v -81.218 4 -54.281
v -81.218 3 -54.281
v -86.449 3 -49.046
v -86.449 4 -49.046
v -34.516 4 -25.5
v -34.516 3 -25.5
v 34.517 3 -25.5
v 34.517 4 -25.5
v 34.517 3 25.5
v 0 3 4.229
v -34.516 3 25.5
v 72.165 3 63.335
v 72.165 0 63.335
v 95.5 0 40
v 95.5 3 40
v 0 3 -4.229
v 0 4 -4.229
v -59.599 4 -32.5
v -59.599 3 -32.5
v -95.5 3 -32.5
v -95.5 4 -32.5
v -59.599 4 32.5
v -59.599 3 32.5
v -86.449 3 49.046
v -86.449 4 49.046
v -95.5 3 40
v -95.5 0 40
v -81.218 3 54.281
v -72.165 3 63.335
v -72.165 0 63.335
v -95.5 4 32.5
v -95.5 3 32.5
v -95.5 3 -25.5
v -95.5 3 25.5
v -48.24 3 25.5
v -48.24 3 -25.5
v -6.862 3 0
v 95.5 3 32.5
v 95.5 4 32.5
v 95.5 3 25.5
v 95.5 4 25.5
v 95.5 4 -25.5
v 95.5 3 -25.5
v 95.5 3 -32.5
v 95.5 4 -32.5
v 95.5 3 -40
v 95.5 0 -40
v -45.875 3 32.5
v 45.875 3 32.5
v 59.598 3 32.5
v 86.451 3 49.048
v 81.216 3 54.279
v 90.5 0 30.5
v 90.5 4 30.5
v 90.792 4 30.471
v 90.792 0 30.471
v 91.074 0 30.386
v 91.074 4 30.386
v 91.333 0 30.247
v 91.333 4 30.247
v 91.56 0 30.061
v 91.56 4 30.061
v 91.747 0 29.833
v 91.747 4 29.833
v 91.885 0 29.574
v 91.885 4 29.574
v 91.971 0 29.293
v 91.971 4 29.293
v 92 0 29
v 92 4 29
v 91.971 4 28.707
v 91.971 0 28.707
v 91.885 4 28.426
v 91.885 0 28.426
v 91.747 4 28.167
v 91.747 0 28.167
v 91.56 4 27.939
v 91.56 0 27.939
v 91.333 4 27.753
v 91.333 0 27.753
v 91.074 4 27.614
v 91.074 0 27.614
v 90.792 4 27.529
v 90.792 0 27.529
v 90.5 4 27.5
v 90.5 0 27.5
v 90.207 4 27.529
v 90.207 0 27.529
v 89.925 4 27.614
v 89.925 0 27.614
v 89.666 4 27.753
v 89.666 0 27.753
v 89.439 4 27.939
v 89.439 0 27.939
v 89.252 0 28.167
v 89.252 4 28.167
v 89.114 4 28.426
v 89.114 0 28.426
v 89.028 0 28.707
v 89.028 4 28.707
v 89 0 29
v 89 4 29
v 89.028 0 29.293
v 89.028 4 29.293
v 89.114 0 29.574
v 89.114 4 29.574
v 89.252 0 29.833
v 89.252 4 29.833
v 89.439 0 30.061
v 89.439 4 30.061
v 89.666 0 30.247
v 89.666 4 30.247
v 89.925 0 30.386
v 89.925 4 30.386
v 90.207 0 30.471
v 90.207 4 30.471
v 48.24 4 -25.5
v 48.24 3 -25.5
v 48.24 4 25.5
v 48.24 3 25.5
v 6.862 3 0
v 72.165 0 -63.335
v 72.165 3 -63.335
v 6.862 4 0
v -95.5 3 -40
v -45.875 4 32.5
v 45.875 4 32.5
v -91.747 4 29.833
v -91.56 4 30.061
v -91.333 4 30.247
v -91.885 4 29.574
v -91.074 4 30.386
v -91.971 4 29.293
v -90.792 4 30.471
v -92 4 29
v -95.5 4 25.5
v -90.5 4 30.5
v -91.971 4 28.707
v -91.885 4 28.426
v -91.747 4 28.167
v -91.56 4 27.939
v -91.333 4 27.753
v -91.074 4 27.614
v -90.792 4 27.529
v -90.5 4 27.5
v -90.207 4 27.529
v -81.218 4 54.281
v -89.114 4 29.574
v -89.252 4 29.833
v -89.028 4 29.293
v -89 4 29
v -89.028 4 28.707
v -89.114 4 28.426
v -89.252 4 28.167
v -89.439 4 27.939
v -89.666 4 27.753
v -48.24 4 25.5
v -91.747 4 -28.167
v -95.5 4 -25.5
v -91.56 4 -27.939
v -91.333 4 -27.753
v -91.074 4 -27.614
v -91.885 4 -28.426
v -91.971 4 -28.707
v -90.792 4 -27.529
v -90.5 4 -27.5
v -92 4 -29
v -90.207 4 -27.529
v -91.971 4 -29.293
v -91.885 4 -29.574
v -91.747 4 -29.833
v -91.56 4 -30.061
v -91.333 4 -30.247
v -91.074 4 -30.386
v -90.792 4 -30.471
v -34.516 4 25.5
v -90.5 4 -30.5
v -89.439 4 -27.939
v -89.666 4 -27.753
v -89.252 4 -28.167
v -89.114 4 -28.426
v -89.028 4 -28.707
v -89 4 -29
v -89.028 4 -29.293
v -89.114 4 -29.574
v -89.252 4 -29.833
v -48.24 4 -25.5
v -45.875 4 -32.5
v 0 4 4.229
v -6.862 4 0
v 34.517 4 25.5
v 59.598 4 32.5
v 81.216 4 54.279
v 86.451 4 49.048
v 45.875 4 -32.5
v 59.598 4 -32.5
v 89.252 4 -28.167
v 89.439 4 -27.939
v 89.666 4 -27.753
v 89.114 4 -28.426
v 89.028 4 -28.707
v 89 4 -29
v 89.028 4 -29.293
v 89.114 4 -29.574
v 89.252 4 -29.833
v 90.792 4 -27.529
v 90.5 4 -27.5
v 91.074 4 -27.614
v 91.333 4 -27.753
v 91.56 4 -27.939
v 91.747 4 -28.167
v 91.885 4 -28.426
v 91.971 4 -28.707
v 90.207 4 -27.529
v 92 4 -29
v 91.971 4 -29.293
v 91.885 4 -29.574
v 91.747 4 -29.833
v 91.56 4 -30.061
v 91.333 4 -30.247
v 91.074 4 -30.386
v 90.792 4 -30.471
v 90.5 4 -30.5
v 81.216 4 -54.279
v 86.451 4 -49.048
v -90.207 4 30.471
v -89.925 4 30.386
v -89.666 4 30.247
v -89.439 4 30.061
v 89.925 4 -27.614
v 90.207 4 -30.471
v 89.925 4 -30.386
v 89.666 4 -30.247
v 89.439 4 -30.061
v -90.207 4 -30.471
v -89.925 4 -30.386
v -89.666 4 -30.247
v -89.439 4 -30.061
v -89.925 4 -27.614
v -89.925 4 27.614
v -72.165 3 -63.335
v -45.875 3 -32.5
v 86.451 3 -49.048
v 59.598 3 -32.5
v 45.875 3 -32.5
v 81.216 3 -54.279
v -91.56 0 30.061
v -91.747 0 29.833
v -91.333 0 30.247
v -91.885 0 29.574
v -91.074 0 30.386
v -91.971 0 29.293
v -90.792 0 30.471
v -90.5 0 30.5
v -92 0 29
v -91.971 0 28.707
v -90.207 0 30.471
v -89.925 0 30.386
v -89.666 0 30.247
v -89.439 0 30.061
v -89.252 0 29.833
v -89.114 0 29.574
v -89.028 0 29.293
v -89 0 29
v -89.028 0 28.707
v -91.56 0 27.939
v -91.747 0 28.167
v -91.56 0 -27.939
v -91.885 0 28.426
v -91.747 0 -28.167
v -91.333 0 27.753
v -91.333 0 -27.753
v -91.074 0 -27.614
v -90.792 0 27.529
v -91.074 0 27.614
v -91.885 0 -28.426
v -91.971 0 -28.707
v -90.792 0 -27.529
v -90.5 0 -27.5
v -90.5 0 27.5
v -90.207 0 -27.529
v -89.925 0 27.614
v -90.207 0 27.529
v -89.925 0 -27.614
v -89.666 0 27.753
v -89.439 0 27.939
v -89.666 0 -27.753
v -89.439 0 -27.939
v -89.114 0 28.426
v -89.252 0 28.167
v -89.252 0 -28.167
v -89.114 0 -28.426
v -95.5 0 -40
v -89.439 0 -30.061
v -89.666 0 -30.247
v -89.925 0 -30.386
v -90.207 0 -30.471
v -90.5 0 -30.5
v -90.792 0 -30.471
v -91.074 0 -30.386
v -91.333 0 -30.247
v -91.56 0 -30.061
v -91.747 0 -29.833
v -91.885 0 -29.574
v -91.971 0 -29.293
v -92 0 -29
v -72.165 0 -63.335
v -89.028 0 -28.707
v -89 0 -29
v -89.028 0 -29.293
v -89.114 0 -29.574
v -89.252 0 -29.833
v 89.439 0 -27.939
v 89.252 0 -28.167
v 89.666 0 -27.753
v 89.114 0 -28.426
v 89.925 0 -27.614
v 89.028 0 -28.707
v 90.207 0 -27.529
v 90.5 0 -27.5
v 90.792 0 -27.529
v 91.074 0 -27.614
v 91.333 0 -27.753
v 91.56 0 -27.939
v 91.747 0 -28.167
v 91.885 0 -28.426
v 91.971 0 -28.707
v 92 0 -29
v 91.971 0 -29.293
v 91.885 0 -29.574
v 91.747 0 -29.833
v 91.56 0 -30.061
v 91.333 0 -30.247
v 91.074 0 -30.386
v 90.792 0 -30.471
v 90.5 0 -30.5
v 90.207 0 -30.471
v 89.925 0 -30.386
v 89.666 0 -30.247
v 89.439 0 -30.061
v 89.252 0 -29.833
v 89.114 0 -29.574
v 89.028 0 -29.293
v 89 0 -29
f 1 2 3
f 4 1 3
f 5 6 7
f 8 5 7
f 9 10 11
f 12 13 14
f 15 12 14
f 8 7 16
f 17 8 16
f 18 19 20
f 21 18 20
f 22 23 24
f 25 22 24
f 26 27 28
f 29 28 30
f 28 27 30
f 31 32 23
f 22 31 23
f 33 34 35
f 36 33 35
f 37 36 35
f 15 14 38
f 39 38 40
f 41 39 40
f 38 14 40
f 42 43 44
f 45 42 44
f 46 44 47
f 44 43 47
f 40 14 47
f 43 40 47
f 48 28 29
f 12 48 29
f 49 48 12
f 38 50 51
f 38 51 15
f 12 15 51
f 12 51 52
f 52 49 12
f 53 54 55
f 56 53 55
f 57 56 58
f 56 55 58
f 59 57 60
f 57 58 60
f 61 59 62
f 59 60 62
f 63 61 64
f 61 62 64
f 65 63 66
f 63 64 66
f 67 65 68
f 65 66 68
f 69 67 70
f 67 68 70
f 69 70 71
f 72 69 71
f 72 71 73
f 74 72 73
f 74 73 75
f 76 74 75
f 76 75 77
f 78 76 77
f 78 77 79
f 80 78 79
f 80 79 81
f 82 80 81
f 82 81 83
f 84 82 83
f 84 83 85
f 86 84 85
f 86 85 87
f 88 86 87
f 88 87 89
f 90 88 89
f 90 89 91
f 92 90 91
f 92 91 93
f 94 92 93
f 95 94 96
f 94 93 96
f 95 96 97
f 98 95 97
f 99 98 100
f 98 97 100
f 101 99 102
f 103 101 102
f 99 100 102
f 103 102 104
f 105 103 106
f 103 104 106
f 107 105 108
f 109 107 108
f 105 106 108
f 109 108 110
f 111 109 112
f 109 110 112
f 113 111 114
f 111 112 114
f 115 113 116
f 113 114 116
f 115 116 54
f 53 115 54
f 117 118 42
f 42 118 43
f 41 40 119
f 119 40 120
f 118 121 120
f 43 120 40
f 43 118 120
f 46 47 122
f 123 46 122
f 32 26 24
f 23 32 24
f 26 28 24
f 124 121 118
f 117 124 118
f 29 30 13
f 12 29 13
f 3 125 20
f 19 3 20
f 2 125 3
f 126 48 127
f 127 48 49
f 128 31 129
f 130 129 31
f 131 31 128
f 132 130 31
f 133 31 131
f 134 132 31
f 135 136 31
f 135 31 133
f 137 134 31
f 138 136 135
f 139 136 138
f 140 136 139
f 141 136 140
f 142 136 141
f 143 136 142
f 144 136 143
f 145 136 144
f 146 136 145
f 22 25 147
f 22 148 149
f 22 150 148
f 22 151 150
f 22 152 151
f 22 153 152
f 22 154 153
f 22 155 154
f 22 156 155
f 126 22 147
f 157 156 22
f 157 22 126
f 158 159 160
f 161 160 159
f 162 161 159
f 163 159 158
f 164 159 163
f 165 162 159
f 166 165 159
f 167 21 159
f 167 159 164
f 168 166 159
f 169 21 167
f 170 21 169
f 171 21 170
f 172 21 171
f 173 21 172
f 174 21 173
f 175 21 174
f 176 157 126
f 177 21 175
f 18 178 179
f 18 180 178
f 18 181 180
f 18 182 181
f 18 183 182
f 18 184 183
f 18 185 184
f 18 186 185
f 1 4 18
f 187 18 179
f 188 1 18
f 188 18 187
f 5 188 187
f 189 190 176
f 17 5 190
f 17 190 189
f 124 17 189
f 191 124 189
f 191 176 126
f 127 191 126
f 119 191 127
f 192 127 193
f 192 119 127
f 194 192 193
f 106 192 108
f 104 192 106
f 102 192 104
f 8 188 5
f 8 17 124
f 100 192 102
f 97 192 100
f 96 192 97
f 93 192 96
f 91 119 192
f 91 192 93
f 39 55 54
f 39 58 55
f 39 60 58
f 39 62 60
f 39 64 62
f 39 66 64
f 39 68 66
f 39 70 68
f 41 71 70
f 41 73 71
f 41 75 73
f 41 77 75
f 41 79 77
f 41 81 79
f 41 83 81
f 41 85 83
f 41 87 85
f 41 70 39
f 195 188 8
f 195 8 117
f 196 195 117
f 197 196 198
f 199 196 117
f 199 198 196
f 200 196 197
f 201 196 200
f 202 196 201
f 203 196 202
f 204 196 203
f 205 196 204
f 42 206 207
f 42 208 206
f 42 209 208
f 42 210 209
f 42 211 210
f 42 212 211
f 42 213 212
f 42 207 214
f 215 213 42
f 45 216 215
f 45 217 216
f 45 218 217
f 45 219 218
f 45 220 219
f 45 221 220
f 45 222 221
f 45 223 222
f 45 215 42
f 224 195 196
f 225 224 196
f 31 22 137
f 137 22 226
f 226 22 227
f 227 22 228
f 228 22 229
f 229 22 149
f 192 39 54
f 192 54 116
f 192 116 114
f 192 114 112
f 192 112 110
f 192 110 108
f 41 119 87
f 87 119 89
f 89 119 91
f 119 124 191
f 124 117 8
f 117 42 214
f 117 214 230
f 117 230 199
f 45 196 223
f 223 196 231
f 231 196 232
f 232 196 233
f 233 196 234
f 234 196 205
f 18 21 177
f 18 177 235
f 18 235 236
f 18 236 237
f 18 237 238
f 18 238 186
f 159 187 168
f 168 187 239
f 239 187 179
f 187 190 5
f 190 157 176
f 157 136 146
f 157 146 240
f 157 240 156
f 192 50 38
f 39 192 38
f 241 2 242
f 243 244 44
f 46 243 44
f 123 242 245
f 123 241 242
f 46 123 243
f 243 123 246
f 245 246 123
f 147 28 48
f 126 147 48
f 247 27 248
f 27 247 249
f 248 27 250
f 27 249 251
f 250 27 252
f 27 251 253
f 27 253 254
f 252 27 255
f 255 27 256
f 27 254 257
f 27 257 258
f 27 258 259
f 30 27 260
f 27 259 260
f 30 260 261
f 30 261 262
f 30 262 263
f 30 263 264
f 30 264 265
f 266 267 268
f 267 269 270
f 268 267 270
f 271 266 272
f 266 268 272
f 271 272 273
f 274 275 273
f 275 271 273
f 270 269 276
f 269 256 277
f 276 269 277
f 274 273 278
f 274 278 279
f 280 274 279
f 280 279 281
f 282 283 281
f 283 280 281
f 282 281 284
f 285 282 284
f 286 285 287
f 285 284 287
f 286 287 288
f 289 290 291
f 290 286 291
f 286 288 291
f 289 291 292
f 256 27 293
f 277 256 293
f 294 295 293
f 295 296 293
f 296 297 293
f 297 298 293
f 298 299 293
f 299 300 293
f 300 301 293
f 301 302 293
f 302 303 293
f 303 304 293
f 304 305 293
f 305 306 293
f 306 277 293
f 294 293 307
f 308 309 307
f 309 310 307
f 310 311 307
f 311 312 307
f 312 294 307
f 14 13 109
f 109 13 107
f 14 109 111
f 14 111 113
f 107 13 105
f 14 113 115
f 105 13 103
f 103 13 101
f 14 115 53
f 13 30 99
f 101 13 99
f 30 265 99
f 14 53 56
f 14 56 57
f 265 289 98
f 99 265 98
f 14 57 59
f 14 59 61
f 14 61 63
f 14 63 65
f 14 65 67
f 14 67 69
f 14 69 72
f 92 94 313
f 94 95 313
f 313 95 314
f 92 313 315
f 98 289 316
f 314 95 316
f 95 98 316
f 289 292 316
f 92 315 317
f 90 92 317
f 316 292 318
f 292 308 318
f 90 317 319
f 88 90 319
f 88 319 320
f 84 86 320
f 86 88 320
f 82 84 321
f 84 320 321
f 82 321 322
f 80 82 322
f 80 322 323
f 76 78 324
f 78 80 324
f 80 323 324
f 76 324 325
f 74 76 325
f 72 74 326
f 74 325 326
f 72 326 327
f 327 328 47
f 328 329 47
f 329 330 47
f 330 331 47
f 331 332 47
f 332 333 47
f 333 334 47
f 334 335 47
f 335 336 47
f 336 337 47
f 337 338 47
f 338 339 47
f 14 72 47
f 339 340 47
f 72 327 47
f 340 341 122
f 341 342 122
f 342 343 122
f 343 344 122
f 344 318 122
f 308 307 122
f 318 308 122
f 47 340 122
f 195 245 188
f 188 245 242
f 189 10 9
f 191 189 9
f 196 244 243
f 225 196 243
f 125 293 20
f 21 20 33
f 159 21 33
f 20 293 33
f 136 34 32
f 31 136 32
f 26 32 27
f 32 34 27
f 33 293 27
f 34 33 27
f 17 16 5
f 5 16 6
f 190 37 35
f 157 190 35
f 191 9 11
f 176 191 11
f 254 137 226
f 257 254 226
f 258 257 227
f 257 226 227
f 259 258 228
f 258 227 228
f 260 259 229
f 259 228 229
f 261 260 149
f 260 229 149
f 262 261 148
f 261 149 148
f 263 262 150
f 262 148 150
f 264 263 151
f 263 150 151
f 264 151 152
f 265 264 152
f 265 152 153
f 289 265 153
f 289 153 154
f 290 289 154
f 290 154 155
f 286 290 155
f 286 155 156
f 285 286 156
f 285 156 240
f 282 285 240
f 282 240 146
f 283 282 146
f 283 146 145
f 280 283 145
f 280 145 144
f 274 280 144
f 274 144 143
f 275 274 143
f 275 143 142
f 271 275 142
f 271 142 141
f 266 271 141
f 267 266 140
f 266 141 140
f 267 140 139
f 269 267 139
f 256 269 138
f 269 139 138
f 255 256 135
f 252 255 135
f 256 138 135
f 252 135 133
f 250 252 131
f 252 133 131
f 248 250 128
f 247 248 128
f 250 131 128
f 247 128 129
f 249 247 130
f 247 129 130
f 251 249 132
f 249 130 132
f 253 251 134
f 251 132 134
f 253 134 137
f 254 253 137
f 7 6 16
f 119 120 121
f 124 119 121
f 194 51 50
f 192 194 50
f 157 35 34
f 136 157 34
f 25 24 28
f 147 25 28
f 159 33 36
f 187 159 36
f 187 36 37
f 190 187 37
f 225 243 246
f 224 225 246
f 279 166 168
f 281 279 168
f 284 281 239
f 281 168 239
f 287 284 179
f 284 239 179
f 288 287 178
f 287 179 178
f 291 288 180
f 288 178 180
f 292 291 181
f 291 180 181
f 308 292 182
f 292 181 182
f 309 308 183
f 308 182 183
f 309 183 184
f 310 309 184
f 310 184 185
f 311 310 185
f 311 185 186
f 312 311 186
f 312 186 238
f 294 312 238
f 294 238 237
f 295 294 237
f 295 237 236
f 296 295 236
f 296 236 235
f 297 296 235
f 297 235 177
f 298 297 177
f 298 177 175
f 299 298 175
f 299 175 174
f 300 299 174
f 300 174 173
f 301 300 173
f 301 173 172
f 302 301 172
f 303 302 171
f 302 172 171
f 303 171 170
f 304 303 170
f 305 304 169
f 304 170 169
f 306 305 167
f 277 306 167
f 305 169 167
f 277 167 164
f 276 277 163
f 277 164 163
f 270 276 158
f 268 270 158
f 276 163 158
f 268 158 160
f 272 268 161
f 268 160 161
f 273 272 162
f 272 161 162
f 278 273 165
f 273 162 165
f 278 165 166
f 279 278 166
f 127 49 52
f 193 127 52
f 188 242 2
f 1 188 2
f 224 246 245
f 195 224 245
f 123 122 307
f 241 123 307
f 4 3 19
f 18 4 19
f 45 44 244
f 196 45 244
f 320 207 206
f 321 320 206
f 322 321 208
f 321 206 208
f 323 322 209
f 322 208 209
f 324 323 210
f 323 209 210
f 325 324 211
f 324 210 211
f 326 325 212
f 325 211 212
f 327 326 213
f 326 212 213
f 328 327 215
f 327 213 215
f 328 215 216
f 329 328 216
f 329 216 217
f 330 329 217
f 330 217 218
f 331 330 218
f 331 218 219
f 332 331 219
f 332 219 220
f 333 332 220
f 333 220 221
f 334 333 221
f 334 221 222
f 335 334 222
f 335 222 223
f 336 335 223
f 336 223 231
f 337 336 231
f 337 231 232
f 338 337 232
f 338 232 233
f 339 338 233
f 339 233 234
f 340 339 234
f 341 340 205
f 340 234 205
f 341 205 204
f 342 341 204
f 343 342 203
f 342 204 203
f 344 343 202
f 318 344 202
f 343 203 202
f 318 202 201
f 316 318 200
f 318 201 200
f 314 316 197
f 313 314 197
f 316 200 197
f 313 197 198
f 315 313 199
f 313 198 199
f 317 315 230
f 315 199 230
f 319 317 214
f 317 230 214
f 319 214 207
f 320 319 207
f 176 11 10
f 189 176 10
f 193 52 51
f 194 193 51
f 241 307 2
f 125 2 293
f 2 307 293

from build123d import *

# Parameters (mm, degrees)
SALIENTE_EXTRUIR1_DEPTH = 3
SALIENTE_EXTRUIR2_DEPTH = 1
CROQUIS3_R              = 1.5
CORTAR_EXTRUIR1_DEPTH   = 115.662203643
CROQUIS5_R              = 1.5
CORTAR_EXTRUIR2_DEPTH   = 115.662203643


with BuildPart() as part:
    # Croquis1 → Saliente-Extruir1 (new body)
    with BuildSketch(Plane(origin=(0, 0, 0), x_dir=(1, 0, 0), z_dir=(0, 1, 0))):
        Polygon((-72.165, -63.334523779), (72.165, -63.334523779), (95.499523779, -40), (95.499523779, 40), (72.165, 63.334523779), (-72.165, 63.334523779), (-95.499523779, 40), (-95.499523779, -40), align=None)
    extrude(amount=SALIENTE_EXTRUIR1_DEPTH)

    # Croquis2 → Saliente-Extruir2 (add)
    with BuildSketch(Plane(origin=(0, 3, 0), x_dir=(1, 0, 0), z_dir=(0, 1, 0))):
        Polygon((-95.499523779, -25.5), (-95.499523779, -32.5), (-59.599057268, -32.5), (-86.448609178, -49.046390822), (-81.218176491, -54.281347289), (-45.874561104, -32.5), (45.875356635, -32.5), (81.215914601, -54.279085399), (86.450579917, -49.048363047), (59.59824255, -32.5), (95.499523779, -32.5), (95.499523779, -25.5), (48.239634992, -25.5), (6.861850317, 0), (48.239634992, 25.5), (95.499523779, 25.5), (95.499523779, 32.5), (59.59824255, 32.5), (86.450579917, 49.048363047), (81.215914601, 54.279085399), (45.875356635, 32.5), (-45.874561104, 32.5), (-81.218176491, 54.281347289), (-86.448609178, 49.046390822), (-59.599057268, 32.5), (-95.499523779, 32.5), (-95.499523779, 25.5), (-48.240274232, 25.5), (-6.861850317, 0), (-48.240274232, -25.5), align=None)
        Polygon((34.516573599, -25.5), (-34.515975042, -25.5), (0, -4.228705845), align=None, mode=Mode.SUBTRACT)
        Polygon((0, 4.228705845), (-34.515975042, 25.5), (34.516573599, 25.5), align=None, mode=Mode.SUBTRACT)
    extrude(amount=SALIENTE_EXTRUIR2_DEPTH)

    # Croquis3 → Cortar-Extruir1 (cut, through all)
    with BuildSketch(Plane(origin=(0, 4, 0), x_dir=(1, 0, 0), z_dir=(0, 1, 0))):
        with Locations(Location((-90.499523779, -29, 0), (0, 0, 270))):
            Circle(CROQUIS3_R)
    extrude(amount=-CORTAR_EXTRUIR1_DEPTH, mode=Mode.SUBTRACT)

    # Croquis5 → Cortar-Extruir2 (cut, through all)
    with BuildSketch(Plane(origin=(0, 4, 0), x_dir=(1, 0, 0), z_dir=(0, 1, 0))):
        with Locations(Location((-90.499523779, 29, 0), (0, 0, 270))):
            Circle(CROQUIS5_R)
        with Locations(Location((90.499523779, 29, 0), (0, 0, 270))):
            Circle(CROQUIS5_R)
        with Locations(Location((90.499523779, -29, 0), (0, 0, 270))):
            Circle(CROQUIS5_R)
    extrude(amount=-CORTAR_EXTRUIR2_DEPTH, mode=Mode.SUBTRACT)


solid = part.part
